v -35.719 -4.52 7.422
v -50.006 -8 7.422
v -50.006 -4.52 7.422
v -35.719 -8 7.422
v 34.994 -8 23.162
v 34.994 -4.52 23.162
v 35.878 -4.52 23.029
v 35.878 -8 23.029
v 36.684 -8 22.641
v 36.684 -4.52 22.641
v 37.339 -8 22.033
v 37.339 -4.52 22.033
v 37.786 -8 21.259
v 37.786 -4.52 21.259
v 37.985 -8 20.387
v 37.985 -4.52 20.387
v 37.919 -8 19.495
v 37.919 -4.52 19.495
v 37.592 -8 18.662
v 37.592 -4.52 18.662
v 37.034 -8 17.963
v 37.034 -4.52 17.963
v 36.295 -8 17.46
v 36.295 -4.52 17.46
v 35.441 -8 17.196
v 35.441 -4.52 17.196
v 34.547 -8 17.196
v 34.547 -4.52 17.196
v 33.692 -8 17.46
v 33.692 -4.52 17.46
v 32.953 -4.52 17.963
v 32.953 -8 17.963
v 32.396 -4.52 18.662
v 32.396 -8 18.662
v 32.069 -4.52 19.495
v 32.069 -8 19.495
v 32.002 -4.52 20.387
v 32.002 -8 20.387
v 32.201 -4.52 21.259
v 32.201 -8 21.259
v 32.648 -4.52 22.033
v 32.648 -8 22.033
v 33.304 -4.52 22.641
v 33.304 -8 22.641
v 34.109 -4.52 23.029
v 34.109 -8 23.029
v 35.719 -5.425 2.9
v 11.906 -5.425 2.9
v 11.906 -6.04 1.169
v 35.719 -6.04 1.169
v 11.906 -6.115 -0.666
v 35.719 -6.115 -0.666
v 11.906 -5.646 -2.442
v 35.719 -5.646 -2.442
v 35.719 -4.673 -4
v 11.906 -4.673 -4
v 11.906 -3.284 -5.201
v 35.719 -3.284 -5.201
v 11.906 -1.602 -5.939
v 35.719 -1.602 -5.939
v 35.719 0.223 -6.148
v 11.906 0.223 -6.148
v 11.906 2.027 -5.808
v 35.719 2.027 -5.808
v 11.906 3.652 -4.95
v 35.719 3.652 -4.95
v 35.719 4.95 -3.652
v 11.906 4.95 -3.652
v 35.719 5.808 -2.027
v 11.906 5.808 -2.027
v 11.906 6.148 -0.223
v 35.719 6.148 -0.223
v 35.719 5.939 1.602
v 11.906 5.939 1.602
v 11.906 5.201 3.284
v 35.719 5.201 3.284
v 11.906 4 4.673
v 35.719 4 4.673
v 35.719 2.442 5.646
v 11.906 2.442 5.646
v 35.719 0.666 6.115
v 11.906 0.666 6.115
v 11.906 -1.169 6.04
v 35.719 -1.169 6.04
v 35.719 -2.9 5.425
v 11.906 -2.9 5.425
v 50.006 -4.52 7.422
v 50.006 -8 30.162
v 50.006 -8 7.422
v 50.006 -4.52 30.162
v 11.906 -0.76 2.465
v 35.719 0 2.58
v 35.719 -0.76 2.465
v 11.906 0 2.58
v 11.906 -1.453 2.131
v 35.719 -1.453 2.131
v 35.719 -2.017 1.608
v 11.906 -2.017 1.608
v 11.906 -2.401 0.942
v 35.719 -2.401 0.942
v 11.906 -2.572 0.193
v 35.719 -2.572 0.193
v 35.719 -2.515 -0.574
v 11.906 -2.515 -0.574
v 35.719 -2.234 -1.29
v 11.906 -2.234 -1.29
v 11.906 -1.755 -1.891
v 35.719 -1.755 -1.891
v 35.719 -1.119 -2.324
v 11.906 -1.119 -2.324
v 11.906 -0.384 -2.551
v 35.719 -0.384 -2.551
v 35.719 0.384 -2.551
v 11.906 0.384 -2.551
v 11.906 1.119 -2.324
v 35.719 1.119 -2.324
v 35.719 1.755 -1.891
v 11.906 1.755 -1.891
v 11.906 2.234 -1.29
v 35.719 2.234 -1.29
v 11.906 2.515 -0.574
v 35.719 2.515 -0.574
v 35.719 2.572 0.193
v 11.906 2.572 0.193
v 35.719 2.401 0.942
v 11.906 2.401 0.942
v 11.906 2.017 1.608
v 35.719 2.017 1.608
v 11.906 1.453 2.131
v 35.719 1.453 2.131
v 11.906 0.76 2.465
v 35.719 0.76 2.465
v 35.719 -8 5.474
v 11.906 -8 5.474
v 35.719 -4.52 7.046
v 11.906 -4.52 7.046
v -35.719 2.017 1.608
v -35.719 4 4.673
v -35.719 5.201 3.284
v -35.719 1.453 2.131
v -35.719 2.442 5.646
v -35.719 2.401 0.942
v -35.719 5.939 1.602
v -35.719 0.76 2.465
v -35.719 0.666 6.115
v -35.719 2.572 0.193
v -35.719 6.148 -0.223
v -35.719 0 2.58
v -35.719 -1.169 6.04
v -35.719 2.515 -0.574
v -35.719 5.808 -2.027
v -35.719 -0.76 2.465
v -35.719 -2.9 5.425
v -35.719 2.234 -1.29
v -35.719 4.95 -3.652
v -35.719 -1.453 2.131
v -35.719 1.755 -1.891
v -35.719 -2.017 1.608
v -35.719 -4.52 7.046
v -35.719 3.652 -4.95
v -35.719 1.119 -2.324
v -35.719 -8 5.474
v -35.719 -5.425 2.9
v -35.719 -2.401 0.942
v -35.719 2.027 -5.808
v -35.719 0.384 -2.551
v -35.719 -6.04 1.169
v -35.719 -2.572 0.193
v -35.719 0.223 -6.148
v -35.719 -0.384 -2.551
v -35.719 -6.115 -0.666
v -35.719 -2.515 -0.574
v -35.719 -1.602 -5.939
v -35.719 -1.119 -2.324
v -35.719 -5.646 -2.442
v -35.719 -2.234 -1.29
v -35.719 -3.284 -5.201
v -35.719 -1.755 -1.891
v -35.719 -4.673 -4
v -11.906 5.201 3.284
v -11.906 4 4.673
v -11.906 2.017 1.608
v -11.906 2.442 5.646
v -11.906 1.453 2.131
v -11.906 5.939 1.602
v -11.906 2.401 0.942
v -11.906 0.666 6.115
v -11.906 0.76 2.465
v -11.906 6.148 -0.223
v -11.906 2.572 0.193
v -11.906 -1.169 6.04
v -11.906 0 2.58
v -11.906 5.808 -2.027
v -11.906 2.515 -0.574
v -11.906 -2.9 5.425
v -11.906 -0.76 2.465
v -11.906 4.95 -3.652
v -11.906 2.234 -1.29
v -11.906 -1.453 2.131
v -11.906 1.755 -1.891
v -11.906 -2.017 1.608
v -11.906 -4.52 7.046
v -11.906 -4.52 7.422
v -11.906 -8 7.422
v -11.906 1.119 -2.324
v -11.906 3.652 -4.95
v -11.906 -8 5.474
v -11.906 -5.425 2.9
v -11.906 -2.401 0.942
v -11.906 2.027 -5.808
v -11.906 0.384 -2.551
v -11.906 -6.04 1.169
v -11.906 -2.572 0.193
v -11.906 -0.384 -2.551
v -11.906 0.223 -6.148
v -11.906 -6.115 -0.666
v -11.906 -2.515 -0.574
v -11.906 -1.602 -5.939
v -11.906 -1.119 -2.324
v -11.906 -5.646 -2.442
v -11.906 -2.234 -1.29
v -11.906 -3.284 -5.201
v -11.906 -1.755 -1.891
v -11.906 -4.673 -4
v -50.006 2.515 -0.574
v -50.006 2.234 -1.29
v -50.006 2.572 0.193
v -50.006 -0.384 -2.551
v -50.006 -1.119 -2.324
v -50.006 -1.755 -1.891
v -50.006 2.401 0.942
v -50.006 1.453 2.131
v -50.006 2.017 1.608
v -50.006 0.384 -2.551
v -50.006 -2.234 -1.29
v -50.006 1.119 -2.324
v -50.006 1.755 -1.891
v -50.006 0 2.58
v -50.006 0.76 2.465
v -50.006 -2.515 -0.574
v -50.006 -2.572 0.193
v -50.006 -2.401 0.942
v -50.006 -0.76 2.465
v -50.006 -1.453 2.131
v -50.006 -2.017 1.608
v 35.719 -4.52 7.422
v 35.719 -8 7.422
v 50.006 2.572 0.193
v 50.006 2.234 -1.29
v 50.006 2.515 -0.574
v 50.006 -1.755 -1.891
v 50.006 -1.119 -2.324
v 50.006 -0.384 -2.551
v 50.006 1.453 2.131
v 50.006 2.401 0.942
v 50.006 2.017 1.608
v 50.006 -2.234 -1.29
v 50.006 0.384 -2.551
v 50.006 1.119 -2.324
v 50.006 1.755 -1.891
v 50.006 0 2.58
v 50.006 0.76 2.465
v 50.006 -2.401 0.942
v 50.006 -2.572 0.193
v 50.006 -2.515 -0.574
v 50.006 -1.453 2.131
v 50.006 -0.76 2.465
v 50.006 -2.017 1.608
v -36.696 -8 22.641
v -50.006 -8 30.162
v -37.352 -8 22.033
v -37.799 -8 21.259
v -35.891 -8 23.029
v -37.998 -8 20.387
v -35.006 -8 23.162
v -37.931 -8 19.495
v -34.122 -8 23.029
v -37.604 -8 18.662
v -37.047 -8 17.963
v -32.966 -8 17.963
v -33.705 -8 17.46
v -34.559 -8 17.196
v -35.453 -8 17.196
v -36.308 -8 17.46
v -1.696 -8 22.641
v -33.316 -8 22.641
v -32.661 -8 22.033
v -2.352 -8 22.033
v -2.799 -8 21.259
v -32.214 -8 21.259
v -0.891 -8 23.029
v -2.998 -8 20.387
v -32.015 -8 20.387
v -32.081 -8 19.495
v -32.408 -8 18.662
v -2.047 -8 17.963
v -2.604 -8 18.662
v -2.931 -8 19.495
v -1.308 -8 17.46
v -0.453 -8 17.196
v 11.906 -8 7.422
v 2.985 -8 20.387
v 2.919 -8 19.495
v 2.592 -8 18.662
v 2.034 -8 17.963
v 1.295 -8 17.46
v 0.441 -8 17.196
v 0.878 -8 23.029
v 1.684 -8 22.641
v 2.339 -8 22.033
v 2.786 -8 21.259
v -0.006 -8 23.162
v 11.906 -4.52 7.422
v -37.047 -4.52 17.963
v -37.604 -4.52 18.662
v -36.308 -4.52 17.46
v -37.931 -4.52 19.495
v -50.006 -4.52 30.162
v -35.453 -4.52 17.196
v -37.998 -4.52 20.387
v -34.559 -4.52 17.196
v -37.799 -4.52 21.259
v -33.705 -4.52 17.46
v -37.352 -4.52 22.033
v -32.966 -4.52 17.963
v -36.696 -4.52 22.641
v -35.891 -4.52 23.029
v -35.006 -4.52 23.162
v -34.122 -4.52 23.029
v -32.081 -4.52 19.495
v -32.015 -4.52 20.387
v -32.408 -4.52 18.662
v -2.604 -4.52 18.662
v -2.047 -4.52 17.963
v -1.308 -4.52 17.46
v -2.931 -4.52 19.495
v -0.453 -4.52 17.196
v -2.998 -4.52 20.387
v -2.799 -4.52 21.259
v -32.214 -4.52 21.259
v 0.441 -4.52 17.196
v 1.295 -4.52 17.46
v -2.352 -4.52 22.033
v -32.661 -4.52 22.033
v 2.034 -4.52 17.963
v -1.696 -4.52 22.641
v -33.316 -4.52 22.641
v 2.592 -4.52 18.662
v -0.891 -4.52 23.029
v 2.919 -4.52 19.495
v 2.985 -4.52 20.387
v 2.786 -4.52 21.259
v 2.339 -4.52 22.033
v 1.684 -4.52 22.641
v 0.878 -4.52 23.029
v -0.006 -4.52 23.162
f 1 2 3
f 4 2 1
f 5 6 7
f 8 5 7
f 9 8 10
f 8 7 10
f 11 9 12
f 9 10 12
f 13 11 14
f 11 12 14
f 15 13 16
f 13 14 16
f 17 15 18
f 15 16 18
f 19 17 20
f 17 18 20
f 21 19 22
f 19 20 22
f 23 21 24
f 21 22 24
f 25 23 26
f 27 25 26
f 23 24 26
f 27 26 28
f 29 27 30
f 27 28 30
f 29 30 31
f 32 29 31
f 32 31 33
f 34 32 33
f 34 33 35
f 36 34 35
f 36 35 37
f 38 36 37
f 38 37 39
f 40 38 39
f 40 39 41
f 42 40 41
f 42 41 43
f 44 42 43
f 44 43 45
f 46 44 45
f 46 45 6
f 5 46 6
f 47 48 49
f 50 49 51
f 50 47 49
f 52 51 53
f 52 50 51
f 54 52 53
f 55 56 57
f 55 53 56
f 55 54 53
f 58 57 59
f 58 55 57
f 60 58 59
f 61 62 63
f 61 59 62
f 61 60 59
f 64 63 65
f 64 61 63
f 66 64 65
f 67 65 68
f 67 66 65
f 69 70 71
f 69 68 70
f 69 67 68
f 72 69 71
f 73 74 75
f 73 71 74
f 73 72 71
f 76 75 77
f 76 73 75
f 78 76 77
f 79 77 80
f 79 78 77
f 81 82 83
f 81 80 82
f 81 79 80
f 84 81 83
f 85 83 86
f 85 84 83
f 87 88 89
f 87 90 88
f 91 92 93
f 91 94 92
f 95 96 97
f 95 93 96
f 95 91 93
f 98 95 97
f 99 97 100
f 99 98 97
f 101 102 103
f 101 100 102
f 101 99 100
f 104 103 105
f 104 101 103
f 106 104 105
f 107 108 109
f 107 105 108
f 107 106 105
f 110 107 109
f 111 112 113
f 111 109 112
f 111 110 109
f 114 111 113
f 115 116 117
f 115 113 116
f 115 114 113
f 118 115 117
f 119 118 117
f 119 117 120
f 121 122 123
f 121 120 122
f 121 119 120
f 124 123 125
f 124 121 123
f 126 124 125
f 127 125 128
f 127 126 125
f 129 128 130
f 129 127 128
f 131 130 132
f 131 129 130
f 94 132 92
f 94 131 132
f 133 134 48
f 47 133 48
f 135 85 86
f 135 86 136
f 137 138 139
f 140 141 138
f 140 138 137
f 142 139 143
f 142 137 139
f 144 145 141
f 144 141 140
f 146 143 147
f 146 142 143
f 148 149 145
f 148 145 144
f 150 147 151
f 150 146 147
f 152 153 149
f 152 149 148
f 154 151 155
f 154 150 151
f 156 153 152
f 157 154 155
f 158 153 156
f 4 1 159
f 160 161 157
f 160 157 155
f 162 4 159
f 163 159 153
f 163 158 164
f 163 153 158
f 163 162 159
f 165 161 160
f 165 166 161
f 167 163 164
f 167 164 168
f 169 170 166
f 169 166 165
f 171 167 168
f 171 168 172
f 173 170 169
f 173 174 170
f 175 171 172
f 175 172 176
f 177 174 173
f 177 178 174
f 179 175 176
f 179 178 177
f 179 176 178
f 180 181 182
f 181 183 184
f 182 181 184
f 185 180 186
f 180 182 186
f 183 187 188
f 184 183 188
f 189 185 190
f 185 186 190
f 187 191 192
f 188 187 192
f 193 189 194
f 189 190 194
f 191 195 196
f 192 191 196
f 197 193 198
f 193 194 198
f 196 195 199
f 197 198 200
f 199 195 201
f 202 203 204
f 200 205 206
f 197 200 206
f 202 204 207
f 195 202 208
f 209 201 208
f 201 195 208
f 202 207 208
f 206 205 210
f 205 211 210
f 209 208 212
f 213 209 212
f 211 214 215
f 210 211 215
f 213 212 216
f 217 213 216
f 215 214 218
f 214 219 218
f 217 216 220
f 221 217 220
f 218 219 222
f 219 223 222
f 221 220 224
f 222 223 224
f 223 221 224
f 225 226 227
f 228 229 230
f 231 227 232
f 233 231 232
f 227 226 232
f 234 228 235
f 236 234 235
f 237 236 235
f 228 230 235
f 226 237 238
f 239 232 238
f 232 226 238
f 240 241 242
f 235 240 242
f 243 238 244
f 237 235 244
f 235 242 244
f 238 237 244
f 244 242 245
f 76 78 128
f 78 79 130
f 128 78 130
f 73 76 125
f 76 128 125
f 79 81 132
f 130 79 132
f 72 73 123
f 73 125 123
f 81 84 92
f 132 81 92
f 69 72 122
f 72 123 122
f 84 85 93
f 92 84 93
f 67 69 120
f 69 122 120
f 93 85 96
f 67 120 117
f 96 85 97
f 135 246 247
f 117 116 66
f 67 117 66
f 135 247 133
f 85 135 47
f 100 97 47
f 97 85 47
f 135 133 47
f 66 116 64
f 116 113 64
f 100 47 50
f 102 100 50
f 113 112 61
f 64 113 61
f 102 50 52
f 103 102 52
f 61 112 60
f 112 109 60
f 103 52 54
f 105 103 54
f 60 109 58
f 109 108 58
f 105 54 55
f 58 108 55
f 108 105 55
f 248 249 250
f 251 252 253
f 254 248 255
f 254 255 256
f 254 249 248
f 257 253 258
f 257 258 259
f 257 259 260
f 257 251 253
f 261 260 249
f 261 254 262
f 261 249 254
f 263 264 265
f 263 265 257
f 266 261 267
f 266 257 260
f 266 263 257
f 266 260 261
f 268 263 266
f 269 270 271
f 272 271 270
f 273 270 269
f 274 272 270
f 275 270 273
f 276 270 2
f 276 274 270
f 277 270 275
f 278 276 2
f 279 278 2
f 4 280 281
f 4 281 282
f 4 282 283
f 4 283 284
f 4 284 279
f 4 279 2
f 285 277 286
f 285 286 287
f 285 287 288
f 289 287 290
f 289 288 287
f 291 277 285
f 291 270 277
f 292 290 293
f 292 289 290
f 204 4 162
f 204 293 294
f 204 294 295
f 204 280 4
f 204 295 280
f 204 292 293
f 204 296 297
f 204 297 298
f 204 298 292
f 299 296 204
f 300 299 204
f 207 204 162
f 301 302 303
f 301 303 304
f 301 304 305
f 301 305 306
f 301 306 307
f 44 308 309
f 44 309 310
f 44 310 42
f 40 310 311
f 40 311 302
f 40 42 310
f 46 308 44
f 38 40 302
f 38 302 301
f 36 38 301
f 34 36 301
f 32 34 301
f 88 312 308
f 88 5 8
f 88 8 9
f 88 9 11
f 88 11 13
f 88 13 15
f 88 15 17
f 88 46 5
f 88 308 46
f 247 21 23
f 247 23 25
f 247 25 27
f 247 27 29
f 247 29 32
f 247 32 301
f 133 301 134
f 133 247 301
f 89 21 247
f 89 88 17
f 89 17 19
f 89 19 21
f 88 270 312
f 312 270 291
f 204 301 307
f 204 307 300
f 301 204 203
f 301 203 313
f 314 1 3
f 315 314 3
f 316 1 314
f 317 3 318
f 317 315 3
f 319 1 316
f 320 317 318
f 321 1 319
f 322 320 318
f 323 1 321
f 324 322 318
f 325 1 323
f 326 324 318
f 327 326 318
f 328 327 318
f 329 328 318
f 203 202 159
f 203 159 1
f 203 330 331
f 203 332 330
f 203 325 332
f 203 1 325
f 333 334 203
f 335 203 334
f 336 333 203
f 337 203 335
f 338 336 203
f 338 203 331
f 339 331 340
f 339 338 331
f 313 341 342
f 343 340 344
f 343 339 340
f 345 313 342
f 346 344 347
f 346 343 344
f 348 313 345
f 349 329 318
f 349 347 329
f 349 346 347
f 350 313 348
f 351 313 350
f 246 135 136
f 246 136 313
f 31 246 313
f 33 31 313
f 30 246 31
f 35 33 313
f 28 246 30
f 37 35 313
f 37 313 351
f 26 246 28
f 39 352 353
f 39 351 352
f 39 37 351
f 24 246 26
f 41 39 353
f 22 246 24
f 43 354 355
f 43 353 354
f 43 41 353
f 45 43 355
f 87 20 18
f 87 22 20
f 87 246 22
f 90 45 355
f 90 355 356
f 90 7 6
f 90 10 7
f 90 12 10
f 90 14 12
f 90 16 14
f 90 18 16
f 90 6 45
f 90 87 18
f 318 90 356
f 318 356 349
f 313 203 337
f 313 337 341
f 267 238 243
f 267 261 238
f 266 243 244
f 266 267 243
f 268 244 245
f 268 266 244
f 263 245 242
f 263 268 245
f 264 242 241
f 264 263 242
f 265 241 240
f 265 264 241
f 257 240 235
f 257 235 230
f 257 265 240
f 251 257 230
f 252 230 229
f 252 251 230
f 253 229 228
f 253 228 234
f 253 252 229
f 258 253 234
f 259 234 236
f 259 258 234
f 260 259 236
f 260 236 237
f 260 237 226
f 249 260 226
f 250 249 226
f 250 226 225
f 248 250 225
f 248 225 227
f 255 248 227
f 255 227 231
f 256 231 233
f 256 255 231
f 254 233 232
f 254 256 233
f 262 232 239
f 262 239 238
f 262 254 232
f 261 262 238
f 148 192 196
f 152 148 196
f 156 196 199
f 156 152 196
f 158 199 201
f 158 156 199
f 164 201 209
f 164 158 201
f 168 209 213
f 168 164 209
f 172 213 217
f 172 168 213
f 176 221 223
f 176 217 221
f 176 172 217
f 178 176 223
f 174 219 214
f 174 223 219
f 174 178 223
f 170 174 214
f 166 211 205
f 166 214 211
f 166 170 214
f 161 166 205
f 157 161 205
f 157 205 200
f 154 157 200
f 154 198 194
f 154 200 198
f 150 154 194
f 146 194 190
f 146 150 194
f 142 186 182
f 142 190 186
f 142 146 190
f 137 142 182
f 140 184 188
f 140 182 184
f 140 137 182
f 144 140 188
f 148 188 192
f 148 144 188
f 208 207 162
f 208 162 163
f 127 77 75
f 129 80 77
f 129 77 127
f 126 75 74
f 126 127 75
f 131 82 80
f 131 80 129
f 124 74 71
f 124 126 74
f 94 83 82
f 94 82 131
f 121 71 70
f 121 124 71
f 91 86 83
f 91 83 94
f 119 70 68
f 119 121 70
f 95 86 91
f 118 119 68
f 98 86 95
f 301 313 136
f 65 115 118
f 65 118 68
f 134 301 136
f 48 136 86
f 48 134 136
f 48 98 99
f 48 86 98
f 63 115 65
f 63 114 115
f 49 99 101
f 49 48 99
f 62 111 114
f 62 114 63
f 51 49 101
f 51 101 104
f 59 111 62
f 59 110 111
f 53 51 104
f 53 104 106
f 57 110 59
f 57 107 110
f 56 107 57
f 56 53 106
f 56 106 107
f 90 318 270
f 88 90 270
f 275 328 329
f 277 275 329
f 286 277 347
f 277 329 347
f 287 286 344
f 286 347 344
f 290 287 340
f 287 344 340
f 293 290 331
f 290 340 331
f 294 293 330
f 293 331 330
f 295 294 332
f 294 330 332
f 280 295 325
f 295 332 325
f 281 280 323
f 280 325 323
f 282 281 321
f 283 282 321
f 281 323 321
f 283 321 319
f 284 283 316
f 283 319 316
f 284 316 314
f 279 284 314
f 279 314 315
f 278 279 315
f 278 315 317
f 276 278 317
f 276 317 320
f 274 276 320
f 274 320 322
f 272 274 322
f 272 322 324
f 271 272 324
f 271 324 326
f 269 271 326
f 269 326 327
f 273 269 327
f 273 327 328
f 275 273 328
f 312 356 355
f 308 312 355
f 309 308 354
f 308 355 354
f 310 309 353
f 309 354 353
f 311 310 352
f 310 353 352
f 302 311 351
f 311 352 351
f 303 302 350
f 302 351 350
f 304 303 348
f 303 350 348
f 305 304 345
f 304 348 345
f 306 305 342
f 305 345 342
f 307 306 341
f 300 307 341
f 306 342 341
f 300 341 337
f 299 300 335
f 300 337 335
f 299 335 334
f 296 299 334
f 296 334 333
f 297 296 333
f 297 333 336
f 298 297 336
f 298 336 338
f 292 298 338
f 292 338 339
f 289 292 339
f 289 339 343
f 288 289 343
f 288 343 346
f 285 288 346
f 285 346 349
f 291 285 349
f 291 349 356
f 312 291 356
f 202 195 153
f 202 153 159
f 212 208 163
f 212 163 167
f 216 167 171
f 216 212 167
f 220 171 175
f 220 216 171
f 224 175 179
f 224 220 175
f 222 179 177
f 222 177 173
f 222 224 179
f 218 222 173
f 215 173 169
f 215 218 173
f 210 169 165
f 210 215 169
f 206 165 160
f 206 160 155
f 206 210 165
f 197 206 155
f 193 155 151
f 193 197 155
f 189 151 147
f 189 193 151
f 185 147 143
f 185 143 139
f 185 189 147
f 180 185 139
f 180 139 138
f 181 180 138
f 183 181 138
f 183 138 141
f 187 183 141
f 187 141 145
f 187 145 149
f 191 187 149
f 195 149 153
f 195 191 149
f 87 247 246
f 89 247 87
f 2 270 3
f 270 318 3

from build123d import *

# Parameters (mm, degrees)
SKETCH1_R               = 2.5796875
LEFT_LEAF_DEPTH         = 50.00625
CUT_EXTRUDE1_DEPTH      = 59.94405352
CUT_EXTRUDE1_DEPTH_BACK = 59.94405352
SKETCH2_W               = 14.2875
SKETCH2_H               = 13.573125
SKETCH2_W_2             = 23.8125
SKETCH10_R              = 2.5796875
EXTRUDE1_DEPTH          = 50.00625
SKETCH11_R              = 3
CUT_EXTRUDE2_DEPTH      = 10


with BuildPart() as part:
    # Sketch1 → Left Leaf (new, symmetric)
    with BuildSketch(Plane(origin=(0, 0, 0), x_dir=(0, 0, -1), z_dir=(1, 0, 0))):
        with BuildLine():
            Line((-5.474302966, -8), (-2.899611599, -5.425308633))
            ThreePointArc((-2.899611599, -5.425308633), (4.349811559, 4.349811559), (-5.425308633, -2.899611599))
            Line((-5.425308633, -2.899611599), (-7.045897034, -4.5202))
            Line((-7.045897034, -4.5202), (-30.1625, -4.5202))
            Line((-30.1625, -4.5202), (-30.1625, -8))
            Line((-30.1625, -8), (-5.474302966, -8))
        make_face()
        with Locations(Location((0, 0, 0), (0, 0, 180))):
            Circle(SKETCH1_R, mode=Mode.SUBTRACT)
    extrude(amount=LEFT_LEAF_DEPTH, both=True)

    # Sketch2 → Cut-Extrude1 (cut, two sides: drawn at the far end of the back side and taken through both)
    with BuildSketch(Plane(origin=(0, 0, 0), x_dir=(1, 0, 0), z_dir=(0, 1, 0)).offset(-CUT_EXTRUDE1_DEPTH_BACK)):
        with Locations((42.8625, -0.635)):
            Rectangle(SKETCH2_W, SKETCH2_H)
        with Locations((-42.8625, -0.635)):
            Rectangle(SKETCH2_W, SKETCH2_H)
        with Locations((0, -0.635)):
            Rectangle(SKETCH2_W_2, SKETCH2_H)
    extrude(amount=CUT_EXTRUDE1_DEPTH + CUT_EXTRUDE1_DEPTH_BACK, mode=Mode.SUBTRACT)

    # Sketch11 → Cut-Extrude2 (cut)
    with BuildSketch(Plane(origin=(0, -4.5202, 0), x_dir=(1, 0, 0), z_dir=(0, 1, 0))):
        with Locations(Location((-35.00625, -20.1625, 0), (0, 0, 270))):
            Circle(SKETCH11_R)
        with Locations(Location((-0.00625, -20.1625, 0), (0, 0, 270))):
            Circle(SKETCH11_R)
        with Locations(Location((34.99375, -20.1625, 0), (0, 0, 270))):
            Circle(SKETCH11_R)
    extrude(amount=-CUT_EXTRUDE2_DEPTH, mode=Mode.SUBTRACT)


with BuildPart() as body_2:
    # Sketch10 → Extrude1 (new, symmetric)
    with BuildSketch(Plane(origin=(0, 0, 0), x_dir=(0, 0, -1), z_dir=(1, 0, 0))):
        with Locations(Location((0, 0, 0), (0, 0, 180))):
            Circle(SKETCH10_R)
    extrude(amount=EXTRUDE1_DEPTH, both=True)


solid = Compound([part.part, body_2.part])
